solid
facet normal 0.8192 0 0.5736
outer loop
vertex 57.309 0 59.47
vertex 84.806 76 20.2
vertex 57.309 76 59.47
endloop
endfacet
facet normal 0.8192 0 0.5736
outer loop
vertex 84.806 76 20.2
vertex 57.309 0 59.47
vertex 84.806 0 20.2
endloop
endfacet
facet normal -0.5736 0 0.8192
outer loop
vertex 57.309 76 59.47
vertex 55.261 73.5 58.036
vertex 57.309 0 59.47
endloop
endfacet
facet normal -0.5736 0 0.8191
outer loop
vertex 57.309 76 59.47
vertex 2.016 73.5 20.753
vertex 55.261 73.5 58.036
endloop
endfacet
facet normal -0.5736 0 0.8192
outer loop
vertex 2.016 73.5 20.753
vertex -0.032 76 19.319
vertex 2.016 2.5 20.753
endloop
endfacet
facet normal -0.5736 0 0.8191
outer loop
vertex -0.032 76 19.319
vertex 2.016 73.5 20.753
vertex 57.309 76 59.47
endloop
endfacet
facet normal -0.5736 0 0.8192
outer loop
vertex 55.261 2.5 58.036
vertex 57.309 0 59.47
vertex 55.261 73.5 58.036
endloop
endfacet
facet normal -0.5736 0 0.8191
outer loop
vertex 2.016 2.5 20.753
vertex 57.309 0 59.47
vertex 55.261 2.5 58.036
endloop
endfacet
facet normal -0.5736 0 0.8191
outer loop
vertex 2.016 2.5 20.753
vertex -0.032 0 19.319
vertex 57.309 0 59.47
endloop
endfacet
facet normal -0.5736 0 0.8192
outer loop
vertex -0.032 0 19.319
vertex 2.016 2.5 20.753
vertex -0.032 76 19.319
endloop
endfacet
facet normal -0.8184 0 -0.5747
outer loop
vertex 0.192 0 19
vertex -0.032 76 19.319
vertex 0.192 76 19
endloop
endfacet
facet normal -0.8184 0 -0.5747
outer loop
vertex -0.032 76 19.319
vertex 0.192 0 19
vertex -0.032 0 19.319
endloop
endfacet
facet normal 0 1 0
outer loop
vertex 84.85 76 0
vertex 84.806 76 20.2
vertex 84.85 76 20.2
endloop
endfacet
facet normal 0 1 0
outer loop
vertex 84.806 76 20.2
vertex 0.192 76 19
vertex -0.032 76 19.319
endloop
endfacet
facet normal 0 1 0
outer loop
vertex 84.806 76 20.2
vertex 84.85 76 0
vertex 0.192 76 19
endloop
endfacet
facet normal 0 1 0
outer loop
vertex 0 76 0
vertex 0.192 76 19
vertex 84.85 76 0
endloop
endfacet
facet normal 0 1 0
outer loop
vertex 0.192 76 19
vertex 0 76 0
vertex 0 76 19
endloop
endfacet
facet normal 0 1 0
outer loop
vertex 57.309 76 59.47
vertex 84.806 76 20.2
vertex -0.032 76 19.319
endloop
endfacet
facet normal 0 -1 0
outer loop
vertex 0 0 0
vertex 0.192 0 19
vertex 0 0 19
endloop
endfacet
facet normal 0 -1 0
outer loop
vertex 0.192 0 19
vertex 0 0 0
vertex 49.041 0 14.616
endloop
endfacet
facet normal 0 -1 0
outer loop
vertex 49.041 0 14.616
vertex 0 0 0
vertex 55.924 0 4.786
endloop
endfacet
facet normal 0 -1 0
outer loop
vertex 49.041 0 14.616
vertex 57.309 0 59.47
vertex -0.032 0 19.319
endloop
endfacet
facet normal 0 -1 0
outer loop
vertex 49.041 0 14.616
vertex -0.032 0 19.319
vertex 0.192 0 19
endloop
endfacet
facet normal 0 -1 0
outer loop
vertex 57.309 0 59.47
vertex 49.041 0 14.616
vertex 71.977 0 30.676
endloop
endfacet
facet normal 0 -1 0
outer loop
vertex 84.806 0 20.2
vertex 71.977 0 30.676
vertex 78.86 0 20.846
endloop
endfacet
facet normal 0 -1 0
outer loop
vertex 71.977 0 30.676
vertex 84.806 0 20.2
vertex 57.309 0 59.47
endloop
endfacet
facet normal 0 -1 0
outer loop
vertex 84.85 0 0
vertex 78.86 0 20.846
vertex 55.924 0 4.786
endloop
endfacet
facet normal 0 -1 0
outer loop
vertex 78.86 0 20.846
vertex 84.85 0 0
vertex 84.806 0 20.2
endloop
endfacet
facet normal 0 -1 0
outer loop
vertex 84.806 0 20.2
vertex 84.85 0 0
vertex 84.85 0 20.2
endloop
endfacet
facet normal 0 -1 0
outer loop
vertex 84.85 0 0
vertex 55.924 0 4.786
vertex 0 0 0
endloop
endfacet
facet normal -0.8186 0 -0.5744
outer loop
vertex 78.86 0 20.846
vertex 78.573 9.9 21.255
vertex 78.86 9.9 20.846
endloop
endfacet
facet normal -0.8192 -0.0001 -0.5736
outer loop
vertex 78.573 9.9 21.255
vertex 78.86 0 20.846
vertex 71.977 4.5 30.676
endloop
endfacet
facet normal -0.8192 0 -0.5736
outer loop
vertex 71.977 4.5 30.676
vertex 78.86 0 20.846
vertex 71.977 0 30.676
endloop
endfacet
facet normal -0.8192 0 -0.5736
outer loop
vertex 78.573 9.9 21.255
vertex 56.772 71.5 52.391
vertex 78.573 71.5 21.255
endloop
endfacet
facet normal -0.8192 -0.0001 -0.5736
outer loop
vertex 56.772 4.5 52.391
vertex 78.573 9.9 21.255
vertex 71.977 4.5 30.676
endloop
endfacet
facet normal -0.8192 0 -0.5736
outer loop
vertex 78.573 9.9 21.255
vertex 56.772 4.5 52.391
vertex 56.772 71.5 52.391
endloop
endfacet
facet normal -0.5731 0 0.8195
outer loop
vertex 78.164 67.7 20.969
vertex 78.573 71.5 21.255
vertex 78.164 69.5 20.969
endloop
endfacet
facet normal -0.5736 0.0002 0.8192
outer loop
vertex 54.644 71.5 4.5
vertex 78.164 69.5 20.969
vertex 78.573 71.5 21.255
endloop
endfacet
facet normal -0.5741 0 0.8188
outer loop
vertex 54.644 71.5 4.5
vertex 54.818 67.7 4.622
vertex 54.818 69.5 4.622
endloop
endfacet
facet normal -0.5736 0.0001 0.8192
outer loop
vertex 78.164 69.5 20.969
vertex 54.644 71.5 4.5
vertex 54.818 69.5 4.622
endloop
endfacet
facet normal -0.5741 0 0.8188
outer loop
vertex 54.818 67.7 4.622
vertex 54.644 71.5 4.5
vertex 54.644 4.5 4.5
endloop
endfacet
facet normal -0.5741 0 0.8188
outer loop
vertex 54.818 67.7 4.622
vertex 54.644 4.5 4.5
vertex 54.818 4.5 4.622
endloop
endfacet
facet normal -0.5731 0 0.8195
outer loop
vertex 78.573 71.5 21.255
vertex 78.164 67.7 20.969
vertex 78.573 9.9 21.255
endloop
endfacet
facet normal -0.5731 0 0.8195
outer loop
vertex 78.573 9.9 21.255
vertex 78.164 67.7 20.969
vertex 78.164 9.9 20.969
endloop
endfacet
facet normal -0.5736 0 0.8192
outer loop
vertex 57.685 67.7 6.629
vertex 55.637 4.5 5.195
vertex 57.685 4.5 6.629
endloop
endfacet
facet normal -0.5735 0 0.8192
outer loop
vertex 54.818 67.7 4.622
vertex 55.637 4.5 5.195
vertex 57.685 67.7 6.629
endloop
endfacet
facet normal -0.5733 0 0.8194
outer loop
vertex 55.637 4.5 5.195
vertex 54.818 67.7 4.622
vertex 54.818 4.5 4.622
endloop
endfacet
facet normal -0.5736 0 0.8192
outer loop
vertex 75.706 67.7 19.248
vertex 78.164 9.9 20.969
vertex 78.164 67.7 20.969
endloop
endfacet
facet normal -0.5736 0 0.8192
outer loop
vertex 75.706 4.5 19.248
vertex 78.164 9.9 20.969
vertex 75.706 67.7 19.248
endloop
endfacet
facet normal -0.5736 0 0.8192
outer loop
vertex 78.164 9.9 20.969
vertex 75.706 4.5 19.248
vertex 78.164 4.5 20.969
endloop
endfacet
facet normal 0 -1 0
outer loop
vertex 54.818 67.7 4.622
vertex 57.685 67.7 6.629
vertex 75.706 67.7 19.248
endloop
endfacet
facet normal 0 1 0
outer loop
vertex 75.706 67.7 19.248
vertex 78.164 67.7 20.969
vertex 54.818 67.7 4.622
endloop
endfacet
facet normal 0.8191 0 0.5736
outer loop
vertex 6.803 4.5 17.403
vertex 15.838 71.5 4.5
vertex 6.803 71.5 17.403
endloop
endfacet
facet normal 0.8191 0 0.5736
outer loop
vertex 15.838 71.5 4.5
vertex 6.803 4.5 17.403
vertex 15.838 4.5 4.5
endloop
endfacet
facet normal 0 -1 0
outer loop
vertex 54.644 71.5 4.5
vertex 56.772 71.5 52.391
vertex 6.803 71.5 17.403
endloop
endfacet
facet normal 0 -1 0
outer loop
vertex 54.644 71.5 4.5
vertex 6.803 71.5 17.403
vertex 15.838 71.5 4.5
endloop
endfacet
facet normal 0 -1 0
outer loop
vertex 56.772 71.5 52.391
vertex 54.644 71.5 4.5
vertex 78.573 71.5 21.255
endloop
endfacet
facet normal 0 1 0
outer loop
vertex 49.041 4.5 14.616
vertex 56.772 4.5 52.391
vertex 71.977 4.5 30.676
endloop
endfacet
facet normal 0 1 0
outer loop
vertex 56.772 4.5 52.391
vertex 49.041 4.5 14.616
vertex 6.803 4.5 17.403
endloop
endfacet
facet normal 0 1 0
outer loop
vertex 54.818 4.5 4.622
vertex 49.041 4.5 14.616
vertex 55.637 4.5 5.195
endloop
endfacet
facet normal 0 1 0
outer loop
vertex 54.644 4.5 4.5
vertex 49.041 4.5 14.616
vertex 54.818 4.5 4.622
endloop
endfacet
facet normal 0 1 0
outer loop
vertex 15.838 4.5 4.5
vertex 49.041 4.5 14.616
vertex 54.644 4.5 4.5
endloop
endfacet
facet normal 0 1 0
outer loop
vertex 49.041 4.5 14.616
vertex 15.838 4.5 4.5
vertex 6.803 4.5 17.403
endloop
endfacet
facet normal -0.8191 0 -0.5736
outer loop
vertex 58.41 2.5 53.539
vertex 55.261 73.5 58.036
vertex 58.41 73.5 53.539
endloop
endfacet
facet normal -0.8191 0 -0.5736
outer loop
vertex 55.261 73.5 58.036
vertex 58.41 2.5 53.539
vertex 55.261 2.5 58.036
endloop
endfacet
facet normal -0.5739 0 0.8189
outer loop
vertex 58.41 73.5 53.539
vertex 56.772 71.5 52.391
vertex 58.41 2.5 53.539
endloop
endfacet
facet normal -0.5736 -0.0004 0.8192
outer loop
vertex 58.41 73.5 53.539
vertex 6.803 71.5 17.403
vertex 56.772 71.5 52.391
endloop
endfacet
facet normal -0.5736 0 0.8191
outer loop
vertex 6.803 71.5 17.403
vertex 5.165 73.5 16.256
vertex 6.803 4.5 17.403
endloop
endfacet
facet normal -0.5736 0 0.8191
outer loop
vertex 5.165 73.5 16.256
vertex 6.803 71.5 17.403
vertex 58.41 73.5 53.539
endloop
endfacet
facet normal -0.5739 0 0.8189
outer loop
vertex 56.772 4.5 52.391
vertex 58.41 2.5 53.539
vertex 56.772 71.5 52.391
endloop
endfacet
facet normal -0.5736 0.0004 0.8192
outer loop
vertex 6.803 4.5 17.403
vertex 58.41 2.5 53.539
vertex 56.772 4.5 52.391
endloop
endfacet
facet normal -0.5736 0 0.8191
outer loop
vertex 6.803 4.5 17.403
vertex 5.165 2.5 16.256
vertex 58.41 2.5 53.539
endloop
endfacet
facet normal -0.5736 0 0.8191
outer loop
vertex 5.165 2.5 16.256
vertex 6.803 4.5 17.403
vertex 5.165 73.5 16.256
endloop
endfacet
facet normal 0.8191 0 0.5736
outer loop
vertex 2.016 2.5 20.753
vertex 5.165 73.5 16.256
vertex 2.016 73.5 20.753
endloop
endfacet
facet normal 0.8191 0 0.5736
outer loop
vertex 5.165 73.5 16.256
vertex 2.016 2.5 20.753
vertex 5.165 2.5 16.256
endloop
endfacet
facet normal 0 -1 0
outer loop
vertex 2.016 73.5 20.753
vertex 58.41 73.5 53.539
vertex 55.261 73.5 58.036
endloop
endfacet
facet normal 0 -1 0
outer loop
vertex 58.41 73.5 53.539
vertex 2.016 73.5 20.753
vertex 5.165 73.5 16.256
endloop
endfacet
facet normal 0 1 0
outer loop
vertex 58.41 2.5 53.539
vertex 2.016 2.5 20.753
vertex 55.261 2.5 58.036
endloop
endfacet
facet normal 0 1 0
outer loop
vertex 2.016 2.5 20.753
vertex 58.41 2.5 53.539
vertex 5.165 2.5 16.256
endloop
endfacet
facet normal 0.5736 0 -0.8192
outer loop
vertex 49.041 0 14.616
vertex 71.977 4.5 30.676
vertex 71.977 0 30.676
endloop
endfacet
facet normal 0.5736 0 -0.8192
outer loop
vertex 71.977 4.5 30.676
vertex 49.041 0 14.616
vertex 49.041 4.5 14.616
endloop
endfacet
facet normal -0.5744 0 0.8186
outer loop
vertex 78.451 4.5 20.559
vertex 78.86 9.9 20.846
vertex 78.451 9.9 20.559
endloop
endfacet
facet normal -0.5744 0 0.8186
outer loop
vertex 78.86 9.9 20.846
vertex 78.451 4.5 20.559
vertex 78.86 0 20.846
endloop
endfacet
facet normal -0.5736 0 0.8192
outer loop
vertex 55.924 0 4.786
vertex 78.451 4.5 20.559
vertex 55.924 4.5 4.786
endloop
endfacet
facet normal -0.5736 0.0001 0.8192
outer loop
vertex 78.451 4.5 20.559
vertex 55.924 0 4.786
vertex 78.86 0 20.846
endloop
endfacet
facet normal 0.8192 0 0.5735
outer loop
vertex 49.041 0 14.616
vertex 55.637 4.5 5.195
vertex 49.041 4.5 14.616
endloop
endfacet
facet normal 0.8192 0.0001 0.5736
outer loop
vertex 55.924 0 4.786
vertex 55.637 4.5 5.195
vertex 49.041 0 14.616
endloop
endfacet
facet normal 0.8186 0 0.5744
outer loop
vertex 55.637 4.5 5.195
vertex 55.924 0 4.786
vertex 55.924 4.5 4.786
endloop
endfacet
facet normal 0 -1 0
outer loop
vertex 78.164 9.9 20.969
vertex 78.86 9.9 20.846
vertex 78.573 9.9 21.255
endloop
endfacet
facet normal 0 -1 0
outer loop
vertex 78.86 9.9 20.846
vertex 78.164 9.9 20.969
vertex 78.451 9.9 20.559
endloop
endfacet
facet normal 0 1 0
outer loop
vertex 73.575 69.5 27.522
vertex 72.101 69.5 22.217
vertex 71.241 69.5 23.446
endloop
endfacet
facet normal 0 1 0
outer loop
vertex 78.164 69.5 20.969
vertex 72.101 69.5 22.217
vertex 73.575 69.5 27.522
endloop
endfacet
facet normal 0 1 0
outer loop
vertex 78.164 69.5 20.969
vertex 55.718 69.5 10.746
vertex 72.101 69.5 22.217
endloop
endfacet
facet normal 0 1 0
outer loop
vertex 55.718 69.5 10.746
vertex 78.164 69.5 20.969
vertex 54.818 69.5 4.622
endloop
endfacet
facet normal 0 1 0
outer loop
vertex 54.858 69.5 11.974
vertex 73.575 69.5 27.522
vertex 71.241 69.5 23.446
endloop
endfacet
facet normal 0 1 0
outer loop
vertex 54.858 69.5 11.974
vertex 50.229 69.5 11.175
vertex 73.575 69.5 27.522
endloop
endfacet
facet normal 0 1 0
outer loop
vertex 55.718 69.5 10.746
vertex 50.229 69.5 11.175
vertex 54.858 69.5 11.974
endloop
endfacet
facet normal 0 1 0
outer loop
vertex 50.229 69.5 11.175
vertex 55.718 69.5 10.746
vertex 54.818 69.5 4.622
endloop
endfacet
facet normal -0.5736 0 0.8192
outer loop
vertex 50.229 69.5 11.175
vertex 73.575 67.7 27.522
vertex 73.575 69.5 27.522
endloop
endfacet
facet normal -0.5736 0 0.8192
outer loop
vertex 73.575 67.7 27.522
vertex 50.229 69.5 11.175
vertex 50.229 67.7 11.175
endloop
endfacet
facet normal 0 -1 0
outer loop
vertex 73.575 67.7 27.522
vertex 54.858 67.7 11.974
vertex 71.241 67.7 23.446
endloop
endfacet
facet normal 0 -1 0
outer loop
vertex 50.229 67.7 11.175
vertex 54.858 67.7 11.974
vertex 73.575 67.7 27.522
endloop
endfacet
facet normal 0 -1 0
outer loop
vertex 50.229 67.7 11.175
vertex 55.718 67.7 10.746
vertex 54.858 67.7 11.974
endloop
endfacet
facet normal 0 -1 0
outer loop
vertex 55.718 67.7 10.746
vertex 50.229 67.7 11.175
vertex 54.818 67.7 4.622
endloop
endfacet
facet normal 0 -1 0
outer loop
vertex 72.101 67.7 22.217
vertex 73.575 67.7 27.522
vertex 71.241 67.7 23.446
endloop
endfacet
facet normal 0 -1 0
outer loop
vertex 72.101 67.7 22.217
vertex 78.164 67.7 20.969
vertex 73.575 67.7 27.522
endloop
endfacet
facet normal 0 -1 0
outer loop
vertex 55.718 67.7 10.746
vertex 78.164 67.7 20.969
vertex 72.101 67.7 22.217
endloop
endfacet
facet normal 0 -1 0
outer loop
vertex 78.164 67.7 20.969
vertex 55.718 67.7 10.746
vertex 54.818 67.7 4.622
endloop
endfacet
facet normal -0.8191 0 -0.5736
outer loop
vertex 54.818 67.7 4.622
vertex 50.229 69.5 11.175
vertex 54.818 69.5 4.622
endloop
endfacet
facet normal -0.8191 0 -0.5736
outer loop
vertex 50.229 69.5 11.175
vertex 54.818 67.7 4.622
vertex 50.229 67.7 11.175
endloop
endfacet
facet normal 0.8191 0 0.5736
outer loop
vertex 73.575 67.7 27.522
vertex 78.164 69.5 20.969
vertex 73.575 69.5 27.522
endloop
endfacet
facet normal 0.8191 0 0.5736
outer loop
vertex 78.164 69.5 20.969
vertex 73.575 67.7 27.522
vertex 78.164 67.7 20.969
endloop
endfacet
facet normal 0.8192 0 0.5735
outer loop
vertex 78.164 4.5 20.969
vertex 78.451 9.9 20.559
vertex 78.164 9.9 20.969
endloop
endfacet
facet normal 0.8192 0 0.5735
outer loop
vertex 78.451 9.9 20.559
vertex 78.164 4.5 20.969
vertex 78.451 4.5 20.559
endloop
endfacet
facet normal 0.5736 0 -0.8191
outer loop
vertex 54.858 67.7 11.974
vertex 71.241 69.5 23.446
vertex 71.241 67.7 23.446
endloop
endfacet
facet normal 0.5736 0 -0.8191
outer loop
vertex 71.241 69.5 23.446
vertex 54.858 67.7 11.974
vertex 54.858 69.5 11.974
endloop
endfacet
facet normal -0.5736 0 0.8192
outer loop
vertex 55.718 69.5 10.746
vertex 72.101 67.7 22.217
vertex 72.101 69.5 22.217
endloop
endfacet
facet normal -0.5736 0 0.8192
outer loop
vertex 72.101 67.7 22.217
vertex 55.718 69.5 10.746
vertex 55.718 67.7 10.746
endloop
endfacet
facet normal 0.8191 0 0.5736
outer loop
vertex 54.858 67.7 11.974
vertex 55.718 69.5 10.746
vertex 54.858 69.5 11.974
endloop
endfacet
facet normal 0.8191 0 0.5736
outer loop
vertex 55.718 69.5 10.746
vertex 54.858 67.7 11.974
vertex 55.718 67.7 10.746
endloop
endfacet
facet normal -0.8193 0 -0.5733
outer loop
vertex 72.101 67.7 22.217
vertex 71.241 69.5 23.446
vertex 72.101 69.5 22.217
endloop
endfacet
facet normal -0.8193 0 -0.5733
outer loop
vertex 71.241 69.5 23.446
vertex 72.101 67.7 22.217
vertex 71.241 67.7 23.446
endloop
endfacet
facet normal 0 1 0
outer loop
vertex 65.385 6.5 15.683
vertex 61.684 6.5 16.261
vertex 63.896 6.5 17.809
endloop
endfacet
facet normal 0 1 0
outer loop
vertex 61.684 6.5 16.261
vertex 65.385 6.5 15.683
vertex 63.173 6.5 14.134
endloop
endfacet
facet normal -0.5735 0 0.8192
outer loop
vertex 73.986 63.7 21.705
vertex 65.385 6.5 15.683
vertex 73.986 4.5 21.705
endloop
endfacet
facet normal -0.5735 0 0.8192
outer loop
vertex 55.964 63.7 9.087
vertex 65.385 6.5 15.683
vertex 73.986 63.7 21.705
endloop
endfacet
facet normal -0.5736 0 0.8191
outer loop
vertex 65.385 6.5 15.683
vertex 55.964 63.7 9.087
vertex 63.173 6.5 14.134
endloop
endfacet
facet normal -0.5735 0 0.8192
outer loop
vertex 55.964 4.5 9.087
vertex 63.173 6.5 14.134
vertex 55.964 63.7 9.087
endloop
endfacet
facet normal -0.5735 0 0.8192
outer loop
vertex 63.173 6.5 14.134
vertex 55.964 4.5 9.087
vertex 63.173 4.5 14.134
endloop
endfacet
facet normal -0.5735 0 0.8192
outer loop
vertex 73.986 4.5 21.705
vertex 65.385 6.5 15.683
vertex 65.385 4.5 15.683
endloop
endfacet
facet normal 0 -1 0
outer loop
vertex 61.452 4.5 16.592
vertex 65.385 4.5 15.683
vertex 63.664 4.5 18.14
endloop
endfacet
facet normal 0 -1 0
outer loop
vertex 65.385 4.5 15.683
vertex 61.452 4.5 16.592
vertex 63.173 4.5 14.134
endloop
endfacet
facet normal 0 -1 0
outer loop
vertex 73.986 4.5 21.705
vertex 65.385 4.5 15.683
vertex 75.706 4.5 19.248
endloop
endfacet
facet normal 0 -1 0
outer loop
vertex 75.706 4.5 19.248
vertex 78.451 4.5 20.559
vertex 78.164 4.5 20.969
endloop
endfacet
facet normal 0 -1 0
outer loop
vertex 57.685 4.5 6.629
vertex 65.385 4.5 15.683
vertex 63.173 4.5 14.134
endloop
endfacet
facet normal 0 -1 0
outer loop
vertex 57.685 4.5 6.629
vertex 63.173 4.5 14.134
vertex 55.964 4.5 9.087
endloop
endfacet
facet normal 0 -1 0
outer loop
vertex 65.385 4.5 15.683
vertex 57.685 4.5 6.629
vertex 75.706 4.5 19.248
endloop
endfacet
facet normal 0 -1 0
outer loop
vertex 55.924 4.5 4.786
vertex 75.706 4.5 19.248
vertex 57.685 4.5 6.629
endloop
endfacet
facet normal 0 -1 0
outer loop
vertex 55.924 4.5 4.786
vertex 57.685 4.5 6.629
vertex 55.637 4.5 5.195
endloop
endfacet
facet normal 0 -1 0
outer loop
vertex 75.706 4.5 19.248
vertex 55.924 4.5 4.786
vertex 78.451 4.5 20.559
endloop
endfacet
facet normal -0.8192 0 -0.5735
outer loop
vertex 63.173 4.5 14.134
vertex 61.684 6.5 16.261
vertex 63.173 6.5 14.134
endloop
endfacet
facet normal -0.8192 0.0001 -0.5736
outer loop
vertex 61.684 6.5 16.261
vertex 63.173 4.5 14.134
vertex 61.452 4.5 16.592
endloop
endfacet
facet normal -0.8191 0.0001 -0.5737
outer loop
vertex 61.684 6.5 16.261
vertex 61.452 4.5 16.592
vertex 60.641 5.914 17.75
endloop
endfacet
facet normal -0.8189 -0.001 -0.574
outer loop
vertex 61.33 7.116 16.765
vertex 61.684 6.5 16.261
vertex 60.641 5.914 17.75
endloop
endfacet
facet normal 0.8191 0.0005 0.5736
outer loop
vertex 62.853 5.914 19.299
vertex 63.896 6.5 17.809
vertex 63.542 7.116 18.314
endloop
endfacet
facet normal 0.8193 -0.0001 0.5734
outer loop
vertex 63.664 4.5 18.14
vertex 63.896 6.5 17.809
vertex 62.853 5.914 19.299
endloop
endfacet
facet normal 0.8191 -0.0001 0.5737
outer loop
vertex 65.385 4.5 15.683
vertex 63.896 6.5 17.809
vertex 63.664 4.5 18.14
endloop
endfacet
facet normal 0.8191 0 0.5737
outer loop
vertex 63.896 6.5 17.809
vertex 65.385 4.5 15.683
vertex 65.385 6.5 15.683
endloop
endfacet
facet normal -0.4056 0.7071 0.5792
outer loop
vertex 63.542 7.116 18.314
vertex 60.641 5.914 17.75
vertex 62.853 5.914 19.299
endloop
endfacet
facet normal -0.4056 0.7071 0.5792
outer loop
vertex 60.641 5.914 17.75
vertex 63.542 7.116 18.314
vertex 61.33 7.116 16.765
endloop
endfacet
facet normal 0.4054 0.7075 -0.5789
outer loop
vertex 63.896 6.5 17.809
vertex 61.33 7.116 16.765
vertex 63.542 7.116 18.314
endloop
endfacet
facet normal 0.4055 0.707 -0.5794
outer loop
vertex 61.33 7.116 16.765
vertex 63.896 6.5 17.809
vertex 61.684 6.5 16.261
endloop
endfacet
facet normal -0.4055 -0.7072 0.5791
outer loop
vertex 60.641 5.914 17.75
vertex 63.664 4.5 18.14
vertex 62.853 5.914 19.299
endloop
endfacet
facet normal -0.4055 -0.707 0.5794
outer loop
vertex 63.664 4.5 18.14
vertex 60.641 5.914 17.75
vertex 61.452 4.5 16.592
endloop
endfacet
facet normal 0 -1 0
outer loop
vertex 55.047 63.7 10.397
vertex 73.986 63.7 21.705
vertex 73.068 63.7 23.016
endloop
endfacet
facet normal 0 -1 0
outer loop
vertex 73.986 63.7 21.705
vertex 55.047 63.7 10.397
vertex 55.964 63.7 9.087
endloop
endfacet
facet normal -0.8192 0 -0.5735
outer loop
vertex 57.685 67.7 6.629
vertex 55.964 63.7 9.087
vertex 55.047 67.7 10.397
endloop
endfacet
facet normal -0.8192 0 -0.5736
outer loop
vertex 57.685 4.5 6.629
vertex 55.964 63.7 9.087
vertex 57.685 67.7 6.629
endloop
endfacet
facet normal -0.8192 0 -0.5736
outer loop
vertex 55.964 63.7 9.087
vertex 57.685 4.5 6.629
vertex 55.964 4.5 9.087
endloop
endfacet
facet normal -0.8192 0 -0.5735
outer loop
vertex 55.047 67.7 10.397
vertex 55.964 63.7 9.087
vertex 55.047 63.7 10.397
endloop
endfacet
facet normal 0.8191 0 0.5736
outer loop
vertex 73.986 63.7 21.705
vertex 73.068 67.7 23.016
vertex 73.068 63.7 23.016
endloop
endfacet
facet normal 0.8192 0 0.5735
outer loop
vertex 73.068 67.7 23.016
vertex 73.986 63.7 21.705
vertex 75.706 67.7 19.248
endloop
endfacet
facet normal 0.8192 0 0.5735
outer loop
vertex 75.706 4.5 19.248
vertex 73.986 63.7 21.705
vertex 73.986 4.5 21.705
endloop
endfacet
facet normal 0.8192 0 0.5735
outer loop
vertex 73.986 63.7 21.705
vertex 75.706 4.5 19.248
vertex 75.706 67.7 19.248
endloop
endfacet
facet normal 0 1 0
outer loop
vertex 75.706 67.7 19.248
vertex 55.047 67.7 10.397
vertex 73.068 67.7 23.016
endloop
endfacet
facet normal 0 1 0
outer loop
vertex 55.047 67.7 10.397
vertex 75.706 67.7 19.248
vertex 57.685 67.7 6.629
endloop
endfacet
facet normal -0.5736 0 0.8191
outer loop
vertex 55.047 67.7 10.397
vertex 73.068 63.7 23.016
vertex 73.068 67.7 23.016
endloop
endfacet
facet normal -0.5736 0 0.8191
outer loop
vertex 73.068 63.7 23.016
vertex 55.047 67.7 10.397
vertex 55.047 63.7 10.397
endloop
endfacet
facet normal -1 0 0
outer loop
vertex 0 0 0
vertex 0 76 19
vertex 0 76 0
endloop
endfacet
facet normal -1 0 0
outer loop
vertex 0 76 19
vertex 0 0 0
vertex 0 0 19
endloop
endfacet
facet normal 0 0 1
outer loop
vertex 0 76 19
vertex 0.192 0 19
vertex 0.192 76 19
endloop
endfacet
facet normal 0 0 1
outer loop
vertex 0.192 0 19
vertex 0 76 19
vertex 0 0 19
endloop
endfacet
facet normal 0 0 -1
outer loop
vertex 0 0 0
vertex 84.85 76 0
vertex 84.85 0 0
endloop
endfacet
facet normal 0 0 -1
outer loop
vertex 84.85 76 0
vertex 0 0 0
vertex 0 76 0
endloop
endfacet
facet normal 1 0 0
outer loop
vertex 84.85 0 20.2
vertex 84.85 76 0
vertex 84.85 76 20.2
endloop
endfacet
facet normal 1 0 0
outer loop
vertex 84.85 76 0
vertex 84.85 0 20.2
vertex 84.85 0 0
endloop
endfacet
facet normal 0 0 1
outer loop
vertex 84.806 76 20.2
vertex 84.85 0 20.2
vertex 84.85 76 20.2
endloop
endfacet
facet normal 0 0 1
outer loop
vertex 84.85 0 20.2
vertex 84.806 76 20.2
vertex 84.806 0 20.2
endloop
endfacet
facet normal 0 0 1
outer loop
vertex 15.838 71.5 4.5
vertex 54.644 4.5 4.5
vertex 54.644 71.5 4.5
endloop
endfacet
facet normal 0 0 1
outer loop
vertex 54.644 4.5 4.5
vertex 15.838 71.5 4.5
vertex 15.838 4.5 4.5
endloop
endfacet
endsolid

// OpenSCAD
showBody=true;
showPanel=false;

//panel
if(showPanel){
    difference(){
    cube([70-5-.5,76-5-.5,1]);

    translate([5.25,8.25,0])
    for (row = [1 : 3])
        for (col = [1 : 3]) {
            translate([(col-1)*20, (row-1)*20, -.1])
            cube([14,14,6]);
        }
    }
    for (col = [1 : 2]) {
        translate([(col-1)*20+21, 9.25, -.1])
        cube([3,52,7]);
        
        
        translate([6.25, (col-1)*20+27, -.1])
        rotate([0,0,-90])
        cube([3,52,7]);
    }
}


//The main body
if(showBody){
union(){
    hull(){
    cube([1,76,1]);
    translate([0,0,18])
    cube([1,76,1]);
    translate([18,0,0])
    cube([1,76,1]);
    }
    hull(){
    translate([83.85,0,0])
    cube([1,76,1]);
    translate([83.85,0,19.2])
    cube([1,76,1]);

    translate([55,0,0])
    cube([1,76,1]);
    }



    cube([83.85,76,4.5]);

    translate([27.5,0,-20])
    rotate([0,-35,0])
    union(){
        difference(){
            cube([70,76,48]);
            //main cutout
            translate([9/2,9/2,4.5])
            cube([70-9,76-9,48-4.4]);
            
            //lip for cover
            translate([5/2,5/2,48-5.49])
            cube([70-5,76-5,5.5]);
            
            //usb cutout
            translate([70-25-7.5,-.1,4])
            cube([28,10,12]);
            
            //45 on main box
            translate([0,-.1,-70])
            rotate([0,-55,0])
            cube([80,80,80]);
        }
        //board
        translate([70-5,4.5,4])
        rotate([0,0,90])
        union(){
            baseheight=.5;
            basewidth=65;
            cube([basewidth,28.5,baseheight]);
            translate([0,(28.5-22.5)/2,0])
            cube([basewidth-5.8,22,3+baseheight]);
            translate([basewidth-5.8,(28.5-22.5)/2,0])
            cube([4,22,3+baseheight+1.6]);


            //end board
            translate([basewidth-5.8,(28.5-22.5)/2,0])
            cube([4,18,3+baseheight+1.6]);
            translate([basewidth-5.8+4,0,0])
            difference(){
                cube([1.8,28.5,3+baseheight+5]);
                translate([-.1,(28.5-20)/2,3+baseheight+1.5])
                cube([3,20,1.5]);
            }

            //front board clip
            translate([0,29/2-1,3+baseheight])
            union(){
                cube([2,2.7,3]); 
                translate([0,0,3])   
                rotate([0,45,0])
                cube([1.7,2.7,2]);
            }
        }
    }
}
}
